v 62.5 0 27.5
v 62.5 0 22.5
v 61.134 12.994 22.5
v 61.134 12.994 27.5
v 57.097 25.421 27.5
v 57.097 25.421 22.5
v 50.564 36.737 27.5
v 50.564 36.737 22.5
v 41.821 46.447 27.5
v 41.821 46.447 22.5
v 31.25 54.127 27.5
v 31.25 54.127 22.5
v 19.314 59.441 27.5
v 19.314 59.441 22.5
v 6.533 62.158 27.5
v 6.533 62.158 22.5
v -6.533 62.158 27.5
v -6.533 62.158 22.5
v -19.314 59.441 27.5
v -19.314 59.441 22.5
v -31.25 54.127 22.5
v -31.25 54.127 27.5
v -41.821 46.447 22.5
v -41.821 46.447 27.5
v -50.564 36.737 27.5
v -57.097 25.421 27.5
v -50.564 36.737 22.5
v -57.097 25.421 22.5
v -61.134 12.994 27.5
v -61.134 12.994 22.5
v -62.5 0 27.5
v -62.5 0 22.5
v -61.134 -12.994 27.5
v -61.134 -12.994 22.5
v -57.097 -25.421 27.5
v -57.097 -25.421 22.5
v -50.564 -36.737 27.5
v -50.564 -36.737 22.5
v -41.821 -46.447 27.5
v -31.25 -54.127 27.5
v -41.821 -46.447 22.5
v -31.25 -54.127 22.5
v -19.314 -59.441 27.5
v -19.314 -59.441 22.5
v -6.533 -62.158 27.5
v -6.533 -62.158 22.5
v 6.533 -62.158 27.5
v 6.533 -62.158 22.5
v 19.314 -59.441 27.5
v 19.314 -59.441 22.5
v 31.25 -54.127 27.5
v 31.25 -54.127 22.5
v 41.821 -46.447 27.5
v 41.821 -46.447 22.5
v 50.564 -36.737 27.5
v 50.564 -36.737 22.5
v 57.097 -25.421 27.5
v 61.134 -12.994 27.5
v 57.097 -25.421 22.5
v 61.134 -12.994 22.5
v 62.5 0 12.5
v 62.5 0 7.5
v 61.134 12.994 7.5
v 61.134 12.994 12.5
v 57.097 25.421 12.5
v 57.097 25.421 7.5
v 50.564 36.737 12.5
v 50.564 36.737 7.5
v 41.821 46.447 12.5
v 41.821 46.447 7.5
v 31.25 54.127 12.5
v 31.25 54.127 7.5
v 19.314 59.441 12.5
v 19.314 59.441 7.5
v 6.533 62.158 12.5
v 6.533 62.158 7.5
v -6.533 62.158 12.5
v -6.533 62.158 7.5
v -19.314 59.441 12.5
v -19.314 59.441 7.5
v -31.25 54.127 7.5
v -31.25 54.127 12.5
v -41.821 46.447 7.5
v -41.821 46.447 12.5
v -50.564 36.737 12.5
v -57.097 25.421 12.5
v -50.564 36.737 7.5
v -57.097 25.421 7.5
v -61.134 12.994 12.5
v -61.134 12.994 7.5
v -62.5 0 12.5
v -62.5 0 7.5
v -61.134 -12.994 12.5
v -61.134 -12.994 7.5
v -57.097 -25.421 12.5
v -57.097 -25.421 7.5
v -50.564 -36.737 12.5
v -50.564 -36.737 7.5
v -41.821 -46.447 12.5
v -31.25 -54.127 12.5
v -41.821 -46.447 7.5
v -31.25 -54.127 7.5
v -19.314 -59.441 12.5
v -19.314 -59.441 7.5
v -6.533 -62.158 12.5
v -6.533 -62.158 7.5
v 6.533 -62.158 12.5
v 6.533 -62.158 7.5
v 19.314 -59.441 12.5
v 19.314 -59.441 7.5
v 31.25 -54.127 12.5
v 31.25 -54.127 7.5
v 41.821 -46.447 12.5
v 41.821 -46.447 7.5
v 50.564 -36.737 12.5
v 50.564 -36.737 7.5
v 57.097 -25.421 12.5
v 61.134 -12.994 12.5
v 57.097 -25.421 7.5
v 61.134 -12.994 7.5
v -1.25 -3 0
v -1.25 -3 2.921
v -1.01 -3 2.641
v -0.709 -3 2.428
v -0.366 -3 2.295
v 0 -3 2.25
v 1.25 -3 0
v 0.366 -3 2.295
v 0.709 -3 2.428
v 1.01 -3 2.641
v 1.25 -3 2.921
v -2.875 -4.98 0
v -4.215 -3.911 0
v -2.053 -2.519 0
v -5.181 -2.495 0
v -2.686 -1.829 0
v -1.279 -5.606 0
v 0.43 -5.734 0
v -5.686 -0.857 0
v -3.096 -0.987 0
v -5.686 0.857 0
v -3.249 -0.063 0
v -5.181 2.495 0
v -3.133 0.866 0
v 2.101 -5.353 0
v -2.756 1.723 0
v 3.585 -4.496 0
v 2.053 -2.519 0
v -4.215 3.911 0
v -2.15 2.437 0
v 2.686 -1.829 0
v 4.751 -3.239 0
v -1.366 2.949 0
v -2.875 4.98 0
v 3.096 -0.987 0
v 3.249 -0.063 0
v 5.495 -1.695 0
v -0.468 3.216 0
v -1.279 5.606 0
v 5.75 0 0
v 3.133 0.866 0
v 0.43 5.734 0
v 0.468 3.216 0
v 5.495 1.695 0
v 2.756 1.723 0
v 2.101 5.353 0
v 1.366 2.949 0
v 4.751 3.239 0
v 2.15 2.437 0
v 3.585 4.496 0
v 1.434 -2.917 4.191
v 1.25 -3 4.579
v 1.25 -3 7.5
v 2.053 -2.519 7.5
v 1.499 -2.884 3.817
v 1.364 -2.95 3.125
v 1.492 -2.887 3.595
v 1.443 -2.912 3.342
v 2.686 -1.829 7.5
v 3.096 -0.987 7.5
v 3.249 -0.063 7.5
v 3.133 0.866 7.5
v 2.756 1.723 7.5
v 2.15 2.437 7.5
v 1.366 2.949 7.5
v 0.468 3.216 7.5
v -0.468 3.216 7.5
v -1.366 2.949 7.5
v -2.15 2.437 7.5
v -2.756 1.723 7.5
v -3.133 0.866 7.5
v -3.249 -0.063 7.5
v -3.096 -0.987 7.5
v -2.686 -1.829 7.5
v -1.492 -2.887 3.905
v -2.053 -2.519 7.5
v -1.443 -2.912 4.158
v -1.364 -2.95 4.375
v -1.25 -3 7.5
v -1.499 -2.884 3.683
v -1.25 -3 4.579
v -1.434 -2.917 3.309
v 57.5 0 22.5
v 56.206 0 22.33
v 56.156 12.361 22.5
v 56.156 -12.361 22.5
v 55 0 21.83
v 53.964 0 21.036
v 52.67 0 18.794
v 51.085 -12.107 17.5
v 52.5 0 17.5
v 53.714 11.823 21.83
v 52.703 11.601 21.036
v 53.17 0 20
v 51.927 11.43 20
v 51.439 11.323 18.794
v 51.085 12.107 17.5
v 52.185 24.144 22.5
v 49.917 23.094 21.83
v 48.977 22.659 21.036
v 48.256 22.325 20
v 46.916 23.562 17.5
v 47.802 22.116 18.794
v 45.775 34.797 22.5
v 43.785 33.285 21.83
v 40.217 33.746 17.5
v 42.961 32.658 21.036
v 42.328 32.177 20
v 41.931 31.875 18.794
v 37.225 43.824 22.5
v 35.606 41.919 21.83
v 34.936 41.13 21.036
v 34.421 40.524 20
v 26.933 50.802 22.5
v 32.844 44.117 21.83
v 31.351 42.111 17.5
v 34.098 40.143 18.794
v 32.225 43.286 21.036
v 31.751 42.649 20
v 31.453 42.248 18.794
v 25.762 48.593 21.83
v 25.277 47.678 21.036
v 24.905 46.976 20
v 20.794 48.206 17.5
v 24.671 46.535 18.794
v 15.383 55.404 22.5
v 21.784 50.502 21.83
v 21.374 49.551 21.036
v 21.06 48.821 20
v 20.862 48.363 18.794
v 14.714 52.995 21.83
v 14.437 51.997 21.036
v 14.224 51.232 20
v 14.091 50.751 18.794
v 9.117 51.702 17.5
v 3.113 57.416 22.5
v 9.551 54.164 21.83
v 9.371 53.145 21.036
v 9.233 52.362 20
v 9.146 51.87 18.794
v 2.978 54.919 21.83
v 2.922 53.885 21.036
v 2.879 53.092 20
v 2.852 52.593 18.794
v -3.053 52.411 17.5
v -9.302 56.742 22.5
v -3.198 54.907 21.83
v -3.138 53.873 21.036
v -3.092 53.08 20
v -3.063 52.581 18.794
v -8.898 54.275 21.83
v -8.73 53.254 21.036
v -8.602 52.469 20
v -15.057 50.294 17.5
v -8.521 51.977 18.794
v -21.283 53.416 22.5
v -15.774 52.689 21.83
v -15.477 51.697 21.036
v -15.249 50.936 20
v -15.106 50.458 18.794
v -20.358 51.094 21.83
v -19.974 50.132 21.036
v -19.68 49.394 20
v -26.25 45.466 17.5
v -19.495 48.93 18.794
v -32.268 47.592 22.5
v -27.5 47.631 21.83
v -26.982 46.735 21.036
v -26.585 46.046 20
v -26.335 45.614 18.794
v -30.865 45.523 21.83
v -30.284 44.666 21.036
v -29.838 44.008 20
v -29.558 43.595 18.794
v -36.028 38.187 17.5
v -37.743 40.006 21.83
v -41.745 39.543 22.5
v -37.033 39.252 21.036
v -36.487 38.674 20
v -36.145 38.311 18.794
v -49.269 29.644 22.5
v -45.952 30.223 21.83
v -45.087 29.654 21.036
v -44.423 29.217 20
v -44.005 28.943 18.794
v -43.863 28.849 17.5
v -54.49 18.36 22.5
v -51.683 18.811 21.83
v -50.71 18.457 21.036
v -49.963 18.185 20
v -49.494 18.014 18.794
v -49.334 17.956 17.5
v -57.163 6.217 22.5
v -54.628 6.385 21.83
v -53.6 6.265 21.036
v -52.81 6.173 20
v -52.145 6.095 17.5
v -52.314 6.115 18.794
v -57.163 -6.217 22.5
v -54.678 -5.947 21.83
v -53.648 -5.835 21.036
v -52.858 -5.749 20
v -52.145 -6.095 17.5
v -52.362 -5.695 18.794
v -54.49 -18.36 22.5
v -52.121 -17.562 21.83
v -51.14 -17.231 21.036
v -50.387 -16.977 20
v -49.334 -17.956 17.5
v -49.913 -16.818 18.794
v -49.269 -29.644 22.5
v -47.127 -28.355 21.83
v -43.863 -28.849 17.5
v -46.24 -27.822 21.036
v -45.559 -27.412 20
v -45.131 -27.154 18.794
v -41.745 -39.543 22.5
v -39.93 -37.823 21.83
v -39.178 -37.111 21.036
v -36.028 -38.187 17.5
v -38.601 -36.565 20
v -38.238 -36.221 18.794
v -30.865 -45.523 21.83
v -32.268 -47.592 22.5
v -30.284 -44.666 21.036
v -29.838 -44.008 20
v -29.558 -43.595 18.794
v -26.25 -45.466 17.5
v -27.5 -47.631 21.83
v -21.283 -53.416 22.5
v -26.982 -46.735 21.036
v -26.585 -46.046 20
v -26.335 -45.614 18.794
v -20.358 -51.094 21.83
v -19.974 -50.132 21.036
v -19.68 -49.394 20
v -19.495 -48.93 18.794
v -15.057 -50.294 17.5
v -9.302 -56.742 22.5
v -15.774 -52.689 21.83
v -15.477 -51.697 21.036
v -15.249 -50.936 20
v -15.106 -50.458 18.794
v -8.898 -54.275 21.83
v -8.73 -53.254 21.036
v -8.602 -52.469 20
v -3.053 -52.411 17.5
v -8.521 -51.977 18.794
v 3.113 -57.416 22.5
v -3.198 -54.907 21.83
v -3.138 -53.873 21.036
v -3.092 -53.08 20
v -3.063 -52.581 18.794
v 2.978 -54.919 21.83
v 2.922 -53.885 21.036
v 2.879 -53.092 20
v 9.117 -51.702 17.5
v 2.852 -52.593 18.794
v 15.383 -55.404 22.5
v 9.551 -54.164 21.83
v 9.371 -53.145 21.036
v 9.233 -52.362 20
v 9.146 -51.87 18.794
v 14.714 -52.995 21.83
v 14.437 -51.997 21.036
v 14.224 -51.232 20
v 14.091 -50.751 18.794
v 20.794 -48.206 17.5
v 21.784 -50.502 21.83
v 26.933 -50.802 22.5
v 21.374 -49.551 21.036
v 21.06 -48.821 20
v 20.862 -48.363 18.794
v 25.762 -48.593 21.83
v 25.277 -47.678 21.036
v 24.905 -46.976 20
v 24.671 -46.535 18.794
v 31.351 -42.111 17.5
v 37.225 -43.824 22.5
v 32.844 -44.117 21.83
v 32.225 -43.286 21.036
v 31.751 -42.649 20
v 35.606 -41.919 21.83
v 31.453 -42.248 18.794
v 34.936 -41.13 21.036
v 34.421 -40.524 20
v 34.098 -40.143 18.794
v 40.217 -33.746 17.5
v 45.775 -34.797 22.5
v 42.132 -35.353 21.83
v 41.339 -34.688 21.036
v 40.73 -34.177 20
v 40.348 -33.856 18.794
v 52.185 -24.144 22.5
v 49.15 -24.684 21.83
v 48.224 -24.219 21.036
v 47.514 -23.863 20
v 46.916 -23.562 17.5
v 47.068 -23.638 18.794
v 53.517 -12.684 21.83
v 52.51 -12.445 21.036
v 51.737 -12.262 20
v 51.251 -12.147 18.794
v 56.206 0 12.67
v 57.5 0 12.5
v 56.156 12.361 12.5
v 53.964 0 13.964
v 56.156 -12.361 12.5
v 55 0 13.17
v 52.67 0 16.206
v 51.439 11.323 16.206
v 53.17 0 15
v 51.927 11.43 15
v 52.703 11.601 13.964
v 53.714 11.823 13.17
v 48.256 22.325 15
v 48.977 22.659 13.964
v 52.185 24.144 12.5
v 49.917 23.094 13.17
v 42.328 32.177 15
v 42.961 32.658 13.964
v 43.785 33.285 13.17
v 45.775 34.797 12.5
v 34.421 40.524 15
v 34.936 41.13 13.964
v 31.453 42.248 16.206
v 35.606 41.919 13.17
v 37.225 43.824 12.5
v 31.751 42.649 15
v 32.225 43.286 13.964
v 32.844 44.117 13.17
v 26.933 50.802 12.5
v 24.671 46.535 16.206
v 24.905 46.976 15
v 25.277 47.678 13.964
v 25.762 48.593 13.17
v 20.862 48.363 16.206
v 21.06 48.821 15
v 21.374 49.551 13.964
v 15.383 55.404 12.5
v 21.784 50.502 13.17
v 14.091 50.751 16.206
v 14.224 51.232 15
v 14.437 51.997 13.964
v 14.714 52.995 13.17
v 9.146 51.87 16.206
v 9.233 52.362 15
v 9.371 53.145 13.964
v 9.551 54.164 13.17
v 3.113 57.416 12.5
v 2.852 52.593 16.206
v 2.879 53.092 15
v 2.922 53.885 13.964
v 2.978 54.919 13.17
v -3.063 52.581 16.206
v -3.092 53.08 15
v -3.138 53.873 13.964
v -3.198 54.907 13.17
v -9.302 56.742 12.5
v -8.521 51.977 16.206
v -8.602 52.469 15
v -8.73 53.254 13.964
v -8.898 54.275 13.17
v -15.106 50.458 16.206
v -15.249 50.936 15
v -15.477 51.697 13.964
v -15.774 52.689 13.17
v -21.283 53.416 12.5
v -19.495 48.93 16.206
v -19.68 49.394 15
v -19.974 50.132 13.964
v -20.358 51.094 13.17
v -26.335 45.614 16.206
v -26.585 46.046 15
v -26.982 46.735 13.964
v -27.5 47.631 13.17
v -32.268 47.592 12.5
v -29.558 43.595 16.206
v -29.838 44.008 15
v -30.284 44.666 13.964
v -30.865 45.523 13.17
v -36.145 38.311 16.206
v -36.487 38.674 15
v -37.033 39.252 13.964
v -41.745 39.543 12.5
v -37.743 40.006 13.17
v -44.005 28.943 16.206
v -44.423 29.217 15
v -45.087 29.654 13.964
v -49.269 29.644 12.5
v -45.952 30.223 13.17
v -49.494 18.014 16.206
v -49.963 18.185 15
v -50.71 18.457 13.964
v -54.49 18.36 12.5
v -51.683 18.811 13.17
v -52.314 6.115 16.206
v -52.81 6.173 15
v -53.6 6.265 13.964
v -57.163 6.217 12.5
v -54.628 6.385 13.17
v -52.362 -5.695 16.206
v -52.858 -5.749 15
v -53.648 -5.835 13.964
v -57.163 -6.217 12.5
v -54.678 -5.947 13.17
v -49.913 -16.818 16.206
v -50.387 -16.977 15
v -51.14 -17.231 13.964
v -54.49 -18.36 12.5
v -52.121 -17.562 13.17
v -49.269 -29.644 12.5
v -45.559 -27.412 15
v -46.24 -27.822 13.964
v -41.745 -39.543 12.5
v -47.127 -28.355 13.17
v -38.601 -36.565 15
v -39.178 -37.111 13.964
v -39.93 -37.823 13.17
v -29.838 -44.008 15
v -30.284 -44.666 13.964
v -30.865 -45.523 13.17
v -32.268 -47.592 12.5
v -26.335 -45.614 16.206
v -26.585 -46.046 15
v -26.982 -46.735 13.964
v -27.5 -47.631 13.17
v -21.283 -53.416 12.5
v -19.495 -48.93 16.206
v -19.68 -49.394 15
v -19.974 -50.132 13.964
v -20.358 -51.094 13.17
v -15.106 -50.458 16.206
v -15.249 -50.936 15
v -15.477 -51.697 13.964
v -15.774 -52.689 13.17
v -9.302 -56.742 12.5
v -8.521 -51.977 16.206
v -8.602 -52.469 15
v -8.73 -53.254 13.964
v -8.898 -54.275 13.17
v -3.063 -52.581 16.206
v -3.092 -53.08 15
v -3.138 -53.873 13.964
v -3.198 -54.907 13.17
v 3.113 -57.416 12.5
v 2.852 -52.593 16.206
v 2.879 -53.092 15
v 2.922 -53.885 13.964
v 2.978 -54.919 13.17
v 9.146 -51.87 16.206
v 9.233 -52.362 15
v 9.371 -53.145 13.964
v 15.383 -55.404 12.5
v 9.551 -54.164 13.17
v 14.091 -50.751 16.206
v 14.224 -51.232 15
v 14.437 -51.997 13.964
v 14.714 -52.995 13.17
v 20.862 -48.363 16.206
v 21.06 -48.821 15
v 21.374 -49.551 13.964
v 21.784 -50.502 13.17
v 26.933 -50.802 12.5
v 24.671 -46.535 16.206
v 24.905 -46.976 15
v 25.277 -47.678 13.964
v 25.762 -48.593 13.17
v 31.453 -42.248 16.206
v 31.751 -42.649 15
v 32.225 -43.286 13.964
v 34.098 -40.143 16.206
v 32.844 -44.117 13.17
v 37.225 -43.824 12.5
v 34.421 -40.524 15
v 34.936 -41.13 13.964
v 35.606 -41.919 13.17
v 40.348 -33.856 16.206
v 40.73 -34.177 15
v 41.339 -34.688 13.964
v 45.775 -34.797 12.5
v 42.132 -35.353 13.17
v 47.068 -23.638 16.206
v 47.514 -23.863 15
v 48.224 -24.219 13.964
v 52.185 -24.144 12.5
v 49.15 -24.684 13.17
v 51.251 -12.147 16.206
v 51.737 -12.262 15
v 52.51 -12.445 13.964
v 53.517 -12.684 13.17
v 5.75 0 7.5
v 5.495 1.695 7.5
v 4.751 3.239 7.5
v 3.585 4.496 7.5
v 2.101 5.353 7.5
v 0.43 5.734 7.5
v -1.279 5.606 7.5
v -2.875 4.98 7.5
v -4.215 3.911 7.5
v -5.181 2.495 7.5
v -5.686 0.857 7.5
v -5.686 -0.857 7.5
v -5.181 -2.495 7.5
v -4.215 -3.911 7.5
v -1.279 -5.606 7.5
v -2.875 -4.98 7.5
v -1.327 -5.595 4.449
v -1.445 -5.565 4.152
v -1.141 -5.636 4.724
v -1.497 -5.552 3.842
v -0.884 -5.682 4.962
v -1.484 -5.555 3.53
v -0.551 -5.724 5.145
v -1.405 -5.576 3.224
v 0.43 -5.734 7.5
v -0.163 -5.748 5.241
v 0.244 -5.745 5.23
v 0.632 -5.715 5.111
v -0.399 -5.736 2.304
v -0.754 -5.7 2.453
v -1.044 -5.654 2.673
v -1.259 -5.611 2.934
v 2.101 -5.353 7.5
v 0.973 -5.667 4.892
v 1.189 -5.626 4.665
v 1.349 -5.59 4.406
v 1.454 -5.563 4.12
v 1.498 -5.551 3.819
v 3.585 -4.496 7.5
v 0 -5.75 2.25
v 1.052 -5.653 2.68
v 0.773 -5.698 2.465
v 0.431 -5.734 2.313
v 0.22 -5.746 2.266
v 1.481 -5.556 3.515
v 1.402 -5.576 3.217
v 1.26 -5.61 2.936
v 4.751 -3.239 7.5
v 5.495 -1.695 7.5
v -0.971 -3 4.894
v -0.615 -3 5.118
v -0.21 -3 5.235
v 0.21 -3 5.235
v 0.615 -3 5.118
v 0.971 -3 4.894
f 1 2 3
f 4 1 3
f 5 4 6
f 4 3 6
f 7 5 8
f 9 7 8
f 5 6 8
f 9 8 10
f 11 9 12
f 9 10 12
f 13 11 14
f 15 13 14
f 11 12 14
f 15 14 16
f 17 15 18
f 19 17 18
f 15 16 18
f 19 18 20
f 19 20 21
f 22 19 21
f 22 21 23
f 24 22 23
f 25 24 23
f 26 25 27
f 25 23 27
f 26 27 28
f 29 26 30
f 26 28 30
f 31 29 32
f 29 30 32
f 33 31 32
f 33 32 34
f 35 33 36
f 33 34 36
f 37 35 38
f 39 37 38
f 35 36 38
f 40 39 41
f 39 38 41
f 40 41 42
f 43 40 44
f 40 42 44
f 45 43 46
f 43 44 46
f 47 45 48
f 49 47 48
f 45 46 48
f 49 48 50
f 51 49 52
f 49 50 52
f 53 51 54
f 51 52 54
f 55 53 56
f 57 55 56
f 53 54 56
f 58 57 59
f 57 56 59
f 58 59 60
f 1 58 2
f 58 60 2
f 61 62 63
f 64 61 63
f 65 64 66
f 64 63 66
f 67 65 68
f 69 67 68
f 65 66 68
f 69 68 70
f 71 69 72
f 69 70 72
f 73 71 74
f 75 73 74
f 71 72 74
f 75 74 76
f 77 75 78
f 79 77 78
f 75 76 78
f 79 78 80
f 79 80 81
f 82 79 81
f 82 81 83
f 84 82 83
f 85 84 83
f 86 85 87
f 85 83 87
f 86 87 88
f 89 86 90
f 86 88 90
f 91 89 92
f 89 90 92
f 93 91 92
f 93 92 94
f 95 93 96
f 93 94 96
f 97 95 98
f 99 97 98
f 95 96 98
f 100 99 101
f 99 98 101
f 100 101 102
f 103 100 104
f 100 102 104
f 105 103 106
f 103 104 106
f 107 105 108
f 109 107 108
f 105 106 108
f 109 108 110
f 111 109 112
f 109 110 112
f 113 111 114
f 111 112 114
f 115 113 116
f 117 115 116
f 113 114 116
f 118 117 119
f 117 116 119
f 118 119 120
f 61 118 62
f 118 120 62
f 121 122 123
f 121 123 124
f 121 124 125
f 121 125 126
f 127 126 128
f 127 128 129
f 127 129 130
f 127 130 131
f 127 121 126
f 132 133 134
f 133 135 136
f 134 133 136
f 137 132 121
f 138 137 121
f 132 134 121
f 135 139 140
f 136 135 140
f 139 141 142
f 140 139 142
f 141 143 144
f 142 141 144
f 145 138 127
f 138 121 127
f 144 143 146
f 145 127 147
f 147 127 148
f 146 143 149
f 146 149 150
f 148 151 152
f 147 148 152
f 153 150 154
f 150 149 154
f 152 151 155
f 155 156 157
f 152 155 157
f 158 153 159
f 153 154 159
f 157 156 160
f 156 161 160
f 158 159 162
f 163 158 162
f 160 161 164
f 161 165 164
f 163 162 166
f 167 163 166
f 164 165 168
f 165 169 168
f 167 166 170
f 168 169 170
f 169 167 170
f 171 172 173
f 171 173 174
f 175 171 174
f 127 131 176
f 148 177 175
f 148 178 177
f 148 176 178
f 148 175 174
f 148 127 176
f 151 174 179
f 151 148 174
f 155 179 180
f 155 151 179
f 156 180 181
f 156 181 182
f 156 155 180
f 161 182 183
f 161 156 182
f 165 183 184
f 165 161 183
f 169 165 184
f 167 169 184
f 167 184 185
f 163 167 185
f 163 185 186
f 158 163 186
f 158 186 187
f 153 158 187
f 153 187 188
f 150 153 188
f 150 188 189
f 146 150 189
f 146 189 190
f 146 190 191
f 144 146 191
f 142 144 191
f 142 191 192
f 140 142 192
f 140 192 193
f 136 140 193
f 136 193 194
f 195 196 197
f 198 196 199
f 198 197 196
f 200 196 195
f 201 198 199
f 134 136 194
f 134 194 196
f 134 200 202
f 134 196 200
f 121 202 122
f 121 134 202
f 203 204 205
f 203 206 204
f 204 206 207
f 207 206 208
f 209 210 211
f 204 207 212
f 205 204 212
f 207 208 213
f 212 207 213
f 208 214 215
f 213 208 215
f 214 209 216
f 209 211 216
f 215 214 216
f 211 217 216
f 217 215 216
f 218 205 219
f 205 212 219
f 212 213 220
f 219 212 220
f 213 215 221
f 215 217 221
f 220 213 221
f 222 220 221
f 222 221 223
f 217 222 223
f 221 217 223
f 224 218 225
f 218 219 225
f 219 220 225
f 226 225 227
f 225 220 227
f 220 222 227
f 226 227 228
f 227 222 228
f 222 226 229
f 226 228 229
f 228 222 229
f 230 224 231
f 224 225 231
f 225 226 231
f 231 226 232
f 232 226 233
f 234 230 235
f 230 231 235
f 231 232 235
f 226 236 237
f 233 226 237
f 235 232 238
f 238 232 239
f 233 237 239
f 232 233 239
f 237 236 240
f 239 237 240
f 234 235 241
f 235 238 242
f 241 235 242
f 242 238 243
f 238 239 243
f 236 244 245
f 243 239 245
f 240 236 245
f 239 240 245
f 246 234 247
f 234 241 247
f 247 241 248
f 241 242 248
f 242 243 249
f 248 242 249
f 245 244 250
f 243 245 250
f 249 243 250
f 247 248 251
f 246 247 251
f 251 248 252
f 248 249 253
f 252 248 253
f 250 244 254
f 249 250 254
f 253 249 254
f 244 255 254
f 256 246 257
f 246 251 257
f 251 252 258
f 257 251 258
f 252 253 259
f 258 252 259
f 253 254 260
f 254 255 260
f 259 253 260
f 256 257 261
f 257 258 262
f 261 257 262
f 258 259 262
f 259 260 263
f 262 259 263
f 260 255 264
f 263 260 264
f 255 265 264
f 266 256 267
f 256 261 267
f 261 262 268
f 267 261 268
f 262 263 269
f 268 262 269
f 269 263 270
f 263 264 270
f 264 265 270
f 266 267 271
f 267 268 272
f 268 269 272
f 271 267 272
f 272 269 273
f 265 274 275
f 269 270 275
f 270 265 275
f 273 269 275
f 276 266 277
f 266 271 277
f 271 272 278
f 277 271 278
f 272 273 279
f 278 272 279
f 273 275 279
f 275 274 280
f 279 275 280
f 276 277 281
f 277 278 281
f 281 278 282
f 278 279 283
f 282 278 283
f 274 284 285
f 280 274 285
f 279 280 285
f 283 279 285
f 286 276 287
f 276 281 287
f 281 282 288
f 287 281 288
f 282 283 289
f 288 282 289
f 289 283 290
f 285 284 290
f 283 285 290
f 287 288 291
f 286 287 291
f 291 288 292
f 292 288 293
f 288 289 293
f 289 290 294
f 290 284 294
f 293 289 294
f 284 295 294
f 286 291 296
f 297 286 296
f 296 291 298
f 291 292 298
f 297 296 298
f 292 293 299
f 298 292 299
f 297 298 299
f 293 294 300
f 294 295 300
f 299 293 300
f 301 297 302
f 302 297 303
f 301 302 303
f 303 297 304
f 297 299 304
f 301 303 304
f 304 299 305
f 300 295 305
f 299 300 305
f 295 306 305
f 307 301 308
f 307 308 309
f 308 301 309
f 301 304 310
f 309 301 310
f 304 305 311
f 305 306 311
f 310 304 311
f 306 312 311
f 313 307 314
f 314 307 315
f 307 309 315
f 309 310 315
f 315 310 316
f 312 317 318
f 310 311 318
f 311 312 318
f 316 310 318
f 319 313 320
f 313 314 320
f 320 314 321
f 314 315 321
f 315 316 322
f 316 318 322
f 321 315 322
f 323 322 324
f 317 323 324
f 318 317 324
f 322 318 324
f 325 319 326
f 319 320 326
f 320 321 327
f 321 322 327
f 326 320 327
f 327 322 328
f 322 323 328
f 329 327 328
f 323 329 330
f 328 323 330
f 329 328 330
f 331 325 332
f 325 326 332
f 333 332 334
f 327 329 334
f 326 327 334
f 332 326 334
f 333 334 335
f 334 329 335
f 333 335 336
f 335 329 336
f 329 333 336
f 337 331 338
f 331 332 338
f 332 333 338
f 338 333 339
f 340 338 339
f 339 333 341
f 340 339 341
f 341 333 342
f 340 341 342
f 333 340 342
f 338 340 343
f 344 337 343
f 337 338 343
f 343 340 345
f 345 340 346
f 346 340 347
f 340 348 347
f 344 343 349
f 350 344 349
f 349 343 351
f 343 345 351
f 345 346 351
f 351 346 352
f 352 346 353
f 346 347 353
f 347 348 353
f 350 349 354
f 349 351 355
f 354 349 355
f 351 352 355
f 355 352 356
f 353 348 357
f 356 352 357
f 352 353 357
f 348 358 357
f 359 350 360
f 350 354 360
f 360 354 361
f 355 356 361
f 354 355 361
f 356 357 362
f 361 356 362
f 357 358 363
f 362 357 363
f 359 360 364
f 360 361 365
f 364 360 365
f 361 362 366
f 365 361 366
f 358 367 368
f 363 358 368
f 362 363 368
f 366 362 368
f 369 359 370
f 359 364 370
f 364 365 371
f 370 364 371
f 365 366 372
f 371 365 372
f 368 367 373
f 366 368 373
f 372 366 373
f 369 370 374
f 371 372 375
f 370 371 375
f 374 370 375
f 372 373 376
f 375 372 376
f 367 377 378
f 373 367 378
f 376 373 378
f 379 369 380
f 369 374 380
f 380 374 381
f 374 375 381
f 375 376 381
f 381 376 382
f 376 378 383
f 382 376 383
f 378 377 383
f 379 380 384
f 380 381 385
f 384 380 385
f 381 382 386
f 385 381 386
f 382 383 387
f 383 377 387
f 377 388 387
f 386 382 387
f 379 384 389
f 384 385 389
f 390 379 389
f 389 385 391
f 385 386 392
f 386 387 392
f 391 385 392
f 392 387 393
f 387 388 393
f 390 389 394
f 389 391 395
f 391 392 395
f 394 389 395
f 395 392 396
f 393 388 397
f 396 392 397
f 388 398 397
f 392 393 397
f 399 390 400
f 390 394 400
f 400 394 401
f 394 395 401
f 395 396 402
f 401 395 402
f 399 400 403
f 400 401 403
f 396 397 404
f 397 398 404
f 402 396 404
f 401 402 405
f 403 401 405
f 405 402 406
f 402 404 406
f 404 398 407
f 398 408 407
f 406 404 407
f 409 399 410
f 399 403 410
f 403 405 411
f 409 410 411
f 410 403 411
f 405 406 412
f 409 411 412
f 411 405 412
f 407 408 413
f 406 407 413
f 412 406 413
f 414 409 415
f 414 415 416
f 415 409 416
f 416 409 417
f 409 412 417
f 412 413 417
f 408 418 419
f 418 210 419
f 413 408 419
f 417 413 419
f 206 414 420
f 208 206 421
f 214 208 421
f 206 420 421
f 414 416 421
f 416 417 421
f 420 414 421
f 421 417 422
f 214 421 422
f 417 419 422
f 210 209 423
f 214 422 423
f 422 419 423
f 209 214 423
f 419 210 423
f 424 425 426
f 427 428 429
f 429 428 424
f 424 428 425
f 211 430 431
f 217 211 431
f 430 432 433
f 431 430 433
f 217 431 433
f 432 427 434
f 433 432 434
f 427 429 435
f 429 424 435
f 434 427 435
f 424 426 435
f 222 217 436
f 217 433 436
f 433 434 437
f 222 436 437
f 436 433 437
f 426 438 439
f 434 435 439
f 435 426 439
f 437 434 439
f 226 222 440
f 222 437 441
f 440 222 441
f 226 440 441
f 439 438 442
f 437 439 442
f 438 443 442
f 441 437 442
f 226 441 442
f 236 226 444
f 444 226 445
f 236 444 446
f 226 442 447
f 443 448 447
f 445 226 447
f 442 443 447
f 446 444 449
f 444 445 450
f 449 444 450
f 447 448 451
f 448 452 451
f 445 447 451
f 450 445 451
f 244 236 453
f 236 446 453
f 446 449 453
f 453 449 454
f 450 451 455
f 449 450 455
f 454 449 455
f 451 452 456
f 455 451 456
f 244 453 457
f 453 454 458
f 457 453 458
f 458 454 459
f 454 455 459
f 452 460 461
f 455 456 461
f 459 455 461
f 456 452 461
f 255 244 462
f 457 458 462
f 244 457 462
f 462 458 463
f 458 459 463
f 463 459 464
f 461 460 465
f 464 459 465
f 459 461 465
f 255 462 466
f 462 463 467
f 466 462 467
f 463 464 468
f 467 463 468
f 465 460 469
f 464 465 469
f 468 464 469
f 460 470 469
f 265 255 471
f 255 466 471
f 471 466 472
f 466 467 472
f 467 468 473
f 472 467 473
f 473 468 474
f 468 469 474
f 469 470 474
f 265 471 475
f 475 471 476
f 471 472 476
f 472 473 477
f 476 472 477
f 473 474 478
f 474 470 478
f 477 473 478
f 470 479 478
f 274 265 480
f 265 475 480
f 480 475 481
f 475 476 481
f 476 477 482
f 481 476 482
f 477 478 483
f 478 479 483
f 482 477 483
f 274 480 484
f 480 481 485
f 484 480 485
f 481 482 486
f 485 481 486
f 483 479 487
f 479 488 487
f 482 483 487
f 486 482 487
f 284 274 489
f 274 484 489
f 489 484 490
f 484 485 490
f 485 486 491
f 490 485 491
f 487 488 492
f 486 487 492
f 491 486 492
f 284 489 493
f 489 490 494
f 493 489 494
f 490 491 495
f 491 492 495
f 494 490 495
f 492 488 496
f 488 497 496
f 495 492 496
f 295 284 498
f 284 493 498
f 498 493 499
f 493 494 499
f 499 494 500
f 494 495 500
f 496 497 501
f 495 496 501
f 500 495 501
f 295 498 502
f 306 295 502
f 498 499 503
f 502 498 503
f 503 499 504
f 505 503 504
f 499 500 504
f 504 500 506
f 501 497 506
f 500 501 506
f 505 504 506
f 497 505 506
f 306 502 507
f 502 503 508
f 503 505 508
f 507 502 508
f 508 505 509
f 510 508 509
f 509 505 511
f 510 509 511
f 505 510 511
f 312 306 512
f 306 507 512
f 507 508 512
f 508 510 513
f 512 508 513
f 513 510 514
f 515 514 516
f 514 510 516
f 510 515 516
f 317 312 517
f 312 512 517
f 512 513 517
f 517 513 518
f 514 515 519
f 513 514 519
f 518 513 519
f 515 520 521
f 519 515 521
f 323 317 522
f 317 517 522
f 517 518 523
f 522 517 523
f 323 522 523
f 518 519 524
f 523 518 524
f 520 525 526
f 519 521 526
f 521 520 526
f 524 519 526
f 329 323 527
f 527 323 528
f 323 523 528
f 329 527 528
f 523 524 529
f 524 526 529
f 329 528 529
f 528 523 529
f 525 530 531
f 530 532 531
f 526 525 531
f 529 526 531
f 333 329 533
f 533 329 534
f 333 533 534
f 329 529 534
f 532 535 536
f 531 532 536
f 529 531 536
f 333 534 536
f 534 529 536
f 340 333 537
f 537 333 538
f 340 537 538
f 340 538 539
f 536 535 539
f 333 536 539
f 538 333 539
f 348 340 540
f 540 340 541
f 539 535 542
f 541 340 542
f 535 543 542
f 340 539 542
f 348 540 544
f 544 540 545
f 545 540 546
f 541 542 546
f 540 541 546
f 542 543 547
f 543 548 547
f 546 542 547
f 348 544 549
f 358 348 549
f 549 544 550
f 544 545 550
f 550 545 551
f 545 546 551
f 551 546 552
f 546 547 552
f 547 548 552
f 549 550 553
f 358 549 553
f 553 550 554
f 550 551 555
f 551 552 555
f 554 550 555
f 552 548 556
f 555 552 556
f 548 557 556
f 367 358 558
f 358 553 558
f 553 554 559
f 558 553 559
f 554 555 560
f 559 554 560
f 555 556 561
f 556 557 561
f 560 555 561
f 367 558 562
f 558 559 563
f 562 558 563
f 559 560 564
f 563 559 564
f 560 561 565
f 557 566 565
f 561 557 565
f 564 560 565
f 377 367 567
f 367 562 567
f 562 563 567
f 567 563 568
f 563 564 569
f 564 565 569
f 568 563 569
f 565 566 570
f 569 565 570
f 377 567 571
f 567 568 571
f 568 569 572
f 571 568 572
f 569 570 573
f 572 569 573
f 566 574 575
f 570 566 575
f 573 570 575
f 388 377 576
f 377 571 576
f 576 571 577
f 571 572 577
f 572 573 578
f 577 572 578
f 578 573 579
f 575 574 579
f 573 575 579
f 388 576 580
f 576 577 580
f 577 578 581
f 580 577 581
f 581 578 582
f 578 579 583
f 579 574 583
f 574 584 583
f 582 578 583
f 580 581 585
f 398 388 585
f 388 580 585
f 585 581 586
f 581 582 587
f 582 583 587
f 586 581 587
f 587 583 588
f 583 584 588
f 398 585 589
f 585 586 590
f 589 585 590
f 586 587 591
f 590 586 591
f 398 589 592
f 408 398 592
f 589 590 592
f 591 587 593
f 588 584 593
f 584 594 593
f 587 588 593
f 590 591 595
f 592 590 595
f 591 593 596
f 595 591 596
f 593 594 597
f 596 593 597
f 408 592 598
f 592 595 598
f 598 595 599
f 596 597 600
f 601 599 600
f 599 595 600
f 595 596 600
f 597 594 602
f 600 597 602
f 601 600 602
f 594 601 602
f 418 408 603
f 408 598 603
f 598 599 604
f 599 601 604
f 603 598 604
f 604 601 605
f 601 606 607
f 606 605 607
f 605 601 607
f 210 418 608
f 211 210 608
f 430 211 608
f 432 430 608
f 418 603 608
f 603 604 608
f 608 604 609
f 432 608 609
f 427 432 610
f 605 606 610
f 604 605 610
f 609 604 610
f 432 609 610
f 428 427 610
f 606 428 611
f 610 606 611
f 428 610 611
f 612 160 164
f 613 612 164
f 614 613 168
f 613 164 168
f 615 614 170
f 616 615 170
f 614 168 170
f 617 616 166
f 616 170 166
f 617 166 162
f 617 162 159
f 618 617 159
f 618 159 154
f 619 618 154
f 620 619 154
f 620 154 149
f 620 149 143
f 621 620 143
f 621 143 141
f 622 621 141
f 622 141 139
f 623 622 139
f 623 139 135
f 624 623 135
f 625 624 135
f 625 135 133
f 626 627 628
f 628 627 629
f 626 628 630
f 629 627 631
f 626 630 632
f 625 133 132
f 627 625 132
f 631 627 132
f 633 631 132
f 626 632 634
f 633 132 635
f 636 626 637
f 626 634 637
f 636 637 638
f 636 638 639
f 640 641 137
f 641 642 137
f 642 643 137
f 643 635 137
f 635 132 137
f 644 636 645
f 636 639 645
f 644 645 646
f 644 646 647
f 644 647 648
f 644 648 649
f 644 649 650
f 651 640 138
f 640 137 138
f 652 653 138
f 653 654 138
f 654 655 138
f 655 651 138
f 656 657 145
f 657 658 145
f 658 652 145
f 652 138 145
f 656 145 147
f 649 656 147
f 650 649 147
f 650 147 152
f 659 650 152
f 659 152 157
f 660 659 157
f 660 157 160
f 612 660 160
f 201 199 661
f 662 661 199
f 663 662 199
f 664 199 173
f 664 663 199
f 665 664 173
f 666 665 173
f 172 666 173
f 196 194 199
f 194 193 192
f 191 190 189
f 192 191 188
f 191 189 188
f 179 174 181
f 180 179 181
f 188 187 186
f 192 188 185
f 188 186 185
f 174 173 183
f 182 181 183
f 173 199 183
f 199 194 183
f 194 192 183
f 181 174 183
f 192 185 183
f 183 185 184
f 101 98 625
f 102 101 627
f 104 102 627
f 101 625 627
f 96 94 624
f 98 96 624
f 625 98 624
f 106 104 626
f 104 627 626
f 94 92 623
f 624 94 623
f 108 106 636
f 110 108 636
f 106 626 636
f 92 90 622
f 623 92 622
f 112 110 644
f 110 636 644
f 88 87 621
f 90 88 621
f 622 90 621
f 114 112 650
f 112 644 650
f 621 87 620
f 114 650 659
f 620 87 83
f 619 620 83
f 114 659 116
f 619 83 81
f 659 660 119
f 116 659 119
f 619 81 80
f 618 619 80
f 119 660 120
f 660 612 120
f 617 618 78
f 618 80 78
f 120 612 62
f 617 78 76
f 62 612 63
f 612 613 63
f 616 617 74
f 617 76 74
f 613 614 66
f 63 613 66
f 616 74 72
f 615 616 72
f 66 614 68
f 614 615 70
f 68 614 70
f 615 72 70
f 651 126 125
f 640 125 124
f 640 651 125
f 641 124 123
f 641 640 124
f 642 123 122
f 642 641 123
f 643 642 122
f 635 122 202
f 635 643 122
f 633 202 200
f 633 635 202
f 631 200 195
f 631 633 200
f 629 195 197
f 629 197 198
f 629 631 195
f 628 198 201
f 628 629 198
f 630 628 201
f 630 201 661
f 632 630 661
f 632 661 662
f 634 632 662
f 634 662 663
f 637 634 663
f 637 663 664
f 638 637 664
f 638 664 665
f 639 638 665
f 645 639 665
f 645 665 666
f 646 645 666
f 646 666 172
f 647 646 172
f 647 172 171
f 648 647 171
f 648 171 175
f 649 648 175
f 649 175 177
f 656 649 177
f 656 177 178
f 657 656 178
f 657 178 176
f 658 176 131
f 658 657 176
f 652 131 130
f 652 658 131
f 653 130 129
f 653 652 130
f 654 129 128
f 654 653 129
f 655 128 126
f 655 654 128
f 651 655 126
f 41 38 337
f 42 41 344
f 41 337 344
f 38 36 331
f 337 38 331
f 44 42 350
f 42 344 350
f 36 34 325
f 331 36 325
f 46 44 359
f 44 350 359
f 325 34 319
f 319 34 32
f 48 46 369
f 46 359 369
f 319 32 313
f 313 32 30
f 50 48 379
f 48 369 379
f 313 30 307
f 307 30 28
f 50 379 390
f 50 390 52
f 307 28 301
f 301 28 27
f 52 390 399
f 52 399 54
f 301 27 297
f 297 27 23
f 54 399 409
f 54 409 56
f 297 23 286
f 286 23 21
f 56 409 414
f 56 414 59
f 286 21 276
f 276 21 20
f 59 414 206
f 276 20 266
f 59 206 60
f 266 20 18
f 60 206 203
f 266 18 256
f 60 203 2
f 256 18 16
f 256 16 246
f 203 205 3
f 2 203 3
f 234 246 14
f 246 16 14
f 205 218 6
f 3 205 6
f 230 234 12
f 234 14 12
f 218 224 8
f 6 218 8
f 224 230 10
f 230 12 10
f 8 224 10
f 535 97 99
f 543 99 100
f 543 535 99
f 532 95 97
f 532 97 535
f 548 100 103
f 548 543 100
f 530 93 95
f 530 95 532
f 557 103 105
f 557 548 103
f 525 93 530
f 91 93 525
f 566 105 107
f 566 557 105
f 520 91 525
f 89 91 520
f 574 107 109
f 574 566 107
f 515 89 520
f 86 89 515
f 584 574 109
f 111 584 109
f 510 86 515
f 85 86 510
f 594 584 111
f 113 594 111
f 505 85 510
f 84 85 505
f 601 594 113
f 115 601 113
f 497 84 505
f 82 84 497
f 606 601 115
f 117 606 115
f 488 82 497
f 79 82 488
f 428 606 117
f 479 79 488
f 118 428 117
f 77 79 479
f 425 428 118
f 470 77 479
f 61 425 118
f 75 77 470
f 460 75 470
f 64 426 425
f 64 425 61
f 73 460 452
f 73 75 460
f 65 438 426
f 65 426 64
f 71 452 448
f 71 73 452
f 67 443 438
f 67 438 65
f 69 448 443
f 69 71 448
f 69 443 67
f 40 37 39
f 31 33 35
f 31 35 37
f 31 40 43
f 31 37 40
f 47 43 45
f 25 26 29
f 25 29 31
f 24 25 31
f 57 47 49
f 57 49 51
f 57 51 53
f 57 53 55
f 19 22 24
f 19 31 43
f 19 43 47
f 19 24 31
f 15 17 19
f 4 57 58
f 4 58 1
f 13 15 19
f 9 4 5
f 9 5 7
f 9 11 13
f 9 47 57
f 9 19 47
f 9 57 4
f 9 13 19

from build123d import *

# Parameters (mm, degrees)
SKETCH2_R               = 5.75
BOSS_EXTRUDE1_DEPTH     = 7.5
CUT_EXTRUDE1_DEPTH      = 2
CUT_EXTRUDE1_DEPTH_BACK = 13.879246872
SKETCH3_R               = 1.5
SKETCH4_R               = 62.5
BOSS_EXTRUDE2_DEPTH     = 5
SKETCH5_R               = 52.5
BOSS_EXTRUDE3_DEPTH     = 10
SKETCH6_R               = 62.5
BOSS_EXTRUDE4_DEPTH     = 5
FILLET2_R               = 5


with BuildPart() as part:
    # Sketch2 → Boss-Extrude1 (new body)
    with BuildSketch(Plane.XY):
        Circle(SKETCH2_R)
        with BuildLine():
            Line((-1.25, -3), (1.25, -3))
            ThreePointArc((1.25, -3), (0, 3.25), (-1.25, -3))
        make_face(mode=Mode.SUBTRACT)
    extrude(amount=BOSS_EXTRUDE1_DEPTH)

    # Sketch3 → Cut-Extrude1 (cut, two sides: drawn at the far end of the back side and taken through both)
    with BuildSketch(Plane(origin=(0, -3, 0), x_dir=(1, 0, 0), z_dir=(0, 1, 0)).offset(-CUT_EXTRUDE1_DEPTH_BACK)):
        with Locations(Location((0, -3.75, 0), (0, 0, 90))):
            Circle(SKETCH3_R)
    extrude(amount=CUT_EXTRUDE1_DEPTH + CUT_EXTRUDE1_DEPTH_BACK, mode=Mode.SUBTRACT)

    # Sketch4 → Boss-Extrude2 (add)
    with BuildSketch(Plane.XY.offset(7.5)):
        Circle(SKETCH4_R)
    extrude(amount=BOSS_EXTRUDE2_DEPTH)

    # Sketch5 → Boss-Extrude3 (add)
    with BuildSketch(Plane.XY.offset(12.5)):
        Circle(SKETCH5_R)
    extrude(amount=BOSS_EXTRUDE3_DEPTH)

    # Sketch6 → Boss-Extrude4 (add)
    with BuildSketch(Plane.XY.offset(22.5)):
        Circle(SKETCH6_R)
    extrude(amount=BOSS_EXTRUDE4_DEPTH)

    # Fillet2
    fillet2_edges = [part.edges().sort_by_distance(p)[0] for p in [
        (-52.5, 0, 12.5),
        (-52.5, 0, 22.5),
    ]]
    fillet(fillet2_edges, radius=FILLET2_R - 0.0001)  # a hair under: the kernel refuses the full size


solid = part.part
